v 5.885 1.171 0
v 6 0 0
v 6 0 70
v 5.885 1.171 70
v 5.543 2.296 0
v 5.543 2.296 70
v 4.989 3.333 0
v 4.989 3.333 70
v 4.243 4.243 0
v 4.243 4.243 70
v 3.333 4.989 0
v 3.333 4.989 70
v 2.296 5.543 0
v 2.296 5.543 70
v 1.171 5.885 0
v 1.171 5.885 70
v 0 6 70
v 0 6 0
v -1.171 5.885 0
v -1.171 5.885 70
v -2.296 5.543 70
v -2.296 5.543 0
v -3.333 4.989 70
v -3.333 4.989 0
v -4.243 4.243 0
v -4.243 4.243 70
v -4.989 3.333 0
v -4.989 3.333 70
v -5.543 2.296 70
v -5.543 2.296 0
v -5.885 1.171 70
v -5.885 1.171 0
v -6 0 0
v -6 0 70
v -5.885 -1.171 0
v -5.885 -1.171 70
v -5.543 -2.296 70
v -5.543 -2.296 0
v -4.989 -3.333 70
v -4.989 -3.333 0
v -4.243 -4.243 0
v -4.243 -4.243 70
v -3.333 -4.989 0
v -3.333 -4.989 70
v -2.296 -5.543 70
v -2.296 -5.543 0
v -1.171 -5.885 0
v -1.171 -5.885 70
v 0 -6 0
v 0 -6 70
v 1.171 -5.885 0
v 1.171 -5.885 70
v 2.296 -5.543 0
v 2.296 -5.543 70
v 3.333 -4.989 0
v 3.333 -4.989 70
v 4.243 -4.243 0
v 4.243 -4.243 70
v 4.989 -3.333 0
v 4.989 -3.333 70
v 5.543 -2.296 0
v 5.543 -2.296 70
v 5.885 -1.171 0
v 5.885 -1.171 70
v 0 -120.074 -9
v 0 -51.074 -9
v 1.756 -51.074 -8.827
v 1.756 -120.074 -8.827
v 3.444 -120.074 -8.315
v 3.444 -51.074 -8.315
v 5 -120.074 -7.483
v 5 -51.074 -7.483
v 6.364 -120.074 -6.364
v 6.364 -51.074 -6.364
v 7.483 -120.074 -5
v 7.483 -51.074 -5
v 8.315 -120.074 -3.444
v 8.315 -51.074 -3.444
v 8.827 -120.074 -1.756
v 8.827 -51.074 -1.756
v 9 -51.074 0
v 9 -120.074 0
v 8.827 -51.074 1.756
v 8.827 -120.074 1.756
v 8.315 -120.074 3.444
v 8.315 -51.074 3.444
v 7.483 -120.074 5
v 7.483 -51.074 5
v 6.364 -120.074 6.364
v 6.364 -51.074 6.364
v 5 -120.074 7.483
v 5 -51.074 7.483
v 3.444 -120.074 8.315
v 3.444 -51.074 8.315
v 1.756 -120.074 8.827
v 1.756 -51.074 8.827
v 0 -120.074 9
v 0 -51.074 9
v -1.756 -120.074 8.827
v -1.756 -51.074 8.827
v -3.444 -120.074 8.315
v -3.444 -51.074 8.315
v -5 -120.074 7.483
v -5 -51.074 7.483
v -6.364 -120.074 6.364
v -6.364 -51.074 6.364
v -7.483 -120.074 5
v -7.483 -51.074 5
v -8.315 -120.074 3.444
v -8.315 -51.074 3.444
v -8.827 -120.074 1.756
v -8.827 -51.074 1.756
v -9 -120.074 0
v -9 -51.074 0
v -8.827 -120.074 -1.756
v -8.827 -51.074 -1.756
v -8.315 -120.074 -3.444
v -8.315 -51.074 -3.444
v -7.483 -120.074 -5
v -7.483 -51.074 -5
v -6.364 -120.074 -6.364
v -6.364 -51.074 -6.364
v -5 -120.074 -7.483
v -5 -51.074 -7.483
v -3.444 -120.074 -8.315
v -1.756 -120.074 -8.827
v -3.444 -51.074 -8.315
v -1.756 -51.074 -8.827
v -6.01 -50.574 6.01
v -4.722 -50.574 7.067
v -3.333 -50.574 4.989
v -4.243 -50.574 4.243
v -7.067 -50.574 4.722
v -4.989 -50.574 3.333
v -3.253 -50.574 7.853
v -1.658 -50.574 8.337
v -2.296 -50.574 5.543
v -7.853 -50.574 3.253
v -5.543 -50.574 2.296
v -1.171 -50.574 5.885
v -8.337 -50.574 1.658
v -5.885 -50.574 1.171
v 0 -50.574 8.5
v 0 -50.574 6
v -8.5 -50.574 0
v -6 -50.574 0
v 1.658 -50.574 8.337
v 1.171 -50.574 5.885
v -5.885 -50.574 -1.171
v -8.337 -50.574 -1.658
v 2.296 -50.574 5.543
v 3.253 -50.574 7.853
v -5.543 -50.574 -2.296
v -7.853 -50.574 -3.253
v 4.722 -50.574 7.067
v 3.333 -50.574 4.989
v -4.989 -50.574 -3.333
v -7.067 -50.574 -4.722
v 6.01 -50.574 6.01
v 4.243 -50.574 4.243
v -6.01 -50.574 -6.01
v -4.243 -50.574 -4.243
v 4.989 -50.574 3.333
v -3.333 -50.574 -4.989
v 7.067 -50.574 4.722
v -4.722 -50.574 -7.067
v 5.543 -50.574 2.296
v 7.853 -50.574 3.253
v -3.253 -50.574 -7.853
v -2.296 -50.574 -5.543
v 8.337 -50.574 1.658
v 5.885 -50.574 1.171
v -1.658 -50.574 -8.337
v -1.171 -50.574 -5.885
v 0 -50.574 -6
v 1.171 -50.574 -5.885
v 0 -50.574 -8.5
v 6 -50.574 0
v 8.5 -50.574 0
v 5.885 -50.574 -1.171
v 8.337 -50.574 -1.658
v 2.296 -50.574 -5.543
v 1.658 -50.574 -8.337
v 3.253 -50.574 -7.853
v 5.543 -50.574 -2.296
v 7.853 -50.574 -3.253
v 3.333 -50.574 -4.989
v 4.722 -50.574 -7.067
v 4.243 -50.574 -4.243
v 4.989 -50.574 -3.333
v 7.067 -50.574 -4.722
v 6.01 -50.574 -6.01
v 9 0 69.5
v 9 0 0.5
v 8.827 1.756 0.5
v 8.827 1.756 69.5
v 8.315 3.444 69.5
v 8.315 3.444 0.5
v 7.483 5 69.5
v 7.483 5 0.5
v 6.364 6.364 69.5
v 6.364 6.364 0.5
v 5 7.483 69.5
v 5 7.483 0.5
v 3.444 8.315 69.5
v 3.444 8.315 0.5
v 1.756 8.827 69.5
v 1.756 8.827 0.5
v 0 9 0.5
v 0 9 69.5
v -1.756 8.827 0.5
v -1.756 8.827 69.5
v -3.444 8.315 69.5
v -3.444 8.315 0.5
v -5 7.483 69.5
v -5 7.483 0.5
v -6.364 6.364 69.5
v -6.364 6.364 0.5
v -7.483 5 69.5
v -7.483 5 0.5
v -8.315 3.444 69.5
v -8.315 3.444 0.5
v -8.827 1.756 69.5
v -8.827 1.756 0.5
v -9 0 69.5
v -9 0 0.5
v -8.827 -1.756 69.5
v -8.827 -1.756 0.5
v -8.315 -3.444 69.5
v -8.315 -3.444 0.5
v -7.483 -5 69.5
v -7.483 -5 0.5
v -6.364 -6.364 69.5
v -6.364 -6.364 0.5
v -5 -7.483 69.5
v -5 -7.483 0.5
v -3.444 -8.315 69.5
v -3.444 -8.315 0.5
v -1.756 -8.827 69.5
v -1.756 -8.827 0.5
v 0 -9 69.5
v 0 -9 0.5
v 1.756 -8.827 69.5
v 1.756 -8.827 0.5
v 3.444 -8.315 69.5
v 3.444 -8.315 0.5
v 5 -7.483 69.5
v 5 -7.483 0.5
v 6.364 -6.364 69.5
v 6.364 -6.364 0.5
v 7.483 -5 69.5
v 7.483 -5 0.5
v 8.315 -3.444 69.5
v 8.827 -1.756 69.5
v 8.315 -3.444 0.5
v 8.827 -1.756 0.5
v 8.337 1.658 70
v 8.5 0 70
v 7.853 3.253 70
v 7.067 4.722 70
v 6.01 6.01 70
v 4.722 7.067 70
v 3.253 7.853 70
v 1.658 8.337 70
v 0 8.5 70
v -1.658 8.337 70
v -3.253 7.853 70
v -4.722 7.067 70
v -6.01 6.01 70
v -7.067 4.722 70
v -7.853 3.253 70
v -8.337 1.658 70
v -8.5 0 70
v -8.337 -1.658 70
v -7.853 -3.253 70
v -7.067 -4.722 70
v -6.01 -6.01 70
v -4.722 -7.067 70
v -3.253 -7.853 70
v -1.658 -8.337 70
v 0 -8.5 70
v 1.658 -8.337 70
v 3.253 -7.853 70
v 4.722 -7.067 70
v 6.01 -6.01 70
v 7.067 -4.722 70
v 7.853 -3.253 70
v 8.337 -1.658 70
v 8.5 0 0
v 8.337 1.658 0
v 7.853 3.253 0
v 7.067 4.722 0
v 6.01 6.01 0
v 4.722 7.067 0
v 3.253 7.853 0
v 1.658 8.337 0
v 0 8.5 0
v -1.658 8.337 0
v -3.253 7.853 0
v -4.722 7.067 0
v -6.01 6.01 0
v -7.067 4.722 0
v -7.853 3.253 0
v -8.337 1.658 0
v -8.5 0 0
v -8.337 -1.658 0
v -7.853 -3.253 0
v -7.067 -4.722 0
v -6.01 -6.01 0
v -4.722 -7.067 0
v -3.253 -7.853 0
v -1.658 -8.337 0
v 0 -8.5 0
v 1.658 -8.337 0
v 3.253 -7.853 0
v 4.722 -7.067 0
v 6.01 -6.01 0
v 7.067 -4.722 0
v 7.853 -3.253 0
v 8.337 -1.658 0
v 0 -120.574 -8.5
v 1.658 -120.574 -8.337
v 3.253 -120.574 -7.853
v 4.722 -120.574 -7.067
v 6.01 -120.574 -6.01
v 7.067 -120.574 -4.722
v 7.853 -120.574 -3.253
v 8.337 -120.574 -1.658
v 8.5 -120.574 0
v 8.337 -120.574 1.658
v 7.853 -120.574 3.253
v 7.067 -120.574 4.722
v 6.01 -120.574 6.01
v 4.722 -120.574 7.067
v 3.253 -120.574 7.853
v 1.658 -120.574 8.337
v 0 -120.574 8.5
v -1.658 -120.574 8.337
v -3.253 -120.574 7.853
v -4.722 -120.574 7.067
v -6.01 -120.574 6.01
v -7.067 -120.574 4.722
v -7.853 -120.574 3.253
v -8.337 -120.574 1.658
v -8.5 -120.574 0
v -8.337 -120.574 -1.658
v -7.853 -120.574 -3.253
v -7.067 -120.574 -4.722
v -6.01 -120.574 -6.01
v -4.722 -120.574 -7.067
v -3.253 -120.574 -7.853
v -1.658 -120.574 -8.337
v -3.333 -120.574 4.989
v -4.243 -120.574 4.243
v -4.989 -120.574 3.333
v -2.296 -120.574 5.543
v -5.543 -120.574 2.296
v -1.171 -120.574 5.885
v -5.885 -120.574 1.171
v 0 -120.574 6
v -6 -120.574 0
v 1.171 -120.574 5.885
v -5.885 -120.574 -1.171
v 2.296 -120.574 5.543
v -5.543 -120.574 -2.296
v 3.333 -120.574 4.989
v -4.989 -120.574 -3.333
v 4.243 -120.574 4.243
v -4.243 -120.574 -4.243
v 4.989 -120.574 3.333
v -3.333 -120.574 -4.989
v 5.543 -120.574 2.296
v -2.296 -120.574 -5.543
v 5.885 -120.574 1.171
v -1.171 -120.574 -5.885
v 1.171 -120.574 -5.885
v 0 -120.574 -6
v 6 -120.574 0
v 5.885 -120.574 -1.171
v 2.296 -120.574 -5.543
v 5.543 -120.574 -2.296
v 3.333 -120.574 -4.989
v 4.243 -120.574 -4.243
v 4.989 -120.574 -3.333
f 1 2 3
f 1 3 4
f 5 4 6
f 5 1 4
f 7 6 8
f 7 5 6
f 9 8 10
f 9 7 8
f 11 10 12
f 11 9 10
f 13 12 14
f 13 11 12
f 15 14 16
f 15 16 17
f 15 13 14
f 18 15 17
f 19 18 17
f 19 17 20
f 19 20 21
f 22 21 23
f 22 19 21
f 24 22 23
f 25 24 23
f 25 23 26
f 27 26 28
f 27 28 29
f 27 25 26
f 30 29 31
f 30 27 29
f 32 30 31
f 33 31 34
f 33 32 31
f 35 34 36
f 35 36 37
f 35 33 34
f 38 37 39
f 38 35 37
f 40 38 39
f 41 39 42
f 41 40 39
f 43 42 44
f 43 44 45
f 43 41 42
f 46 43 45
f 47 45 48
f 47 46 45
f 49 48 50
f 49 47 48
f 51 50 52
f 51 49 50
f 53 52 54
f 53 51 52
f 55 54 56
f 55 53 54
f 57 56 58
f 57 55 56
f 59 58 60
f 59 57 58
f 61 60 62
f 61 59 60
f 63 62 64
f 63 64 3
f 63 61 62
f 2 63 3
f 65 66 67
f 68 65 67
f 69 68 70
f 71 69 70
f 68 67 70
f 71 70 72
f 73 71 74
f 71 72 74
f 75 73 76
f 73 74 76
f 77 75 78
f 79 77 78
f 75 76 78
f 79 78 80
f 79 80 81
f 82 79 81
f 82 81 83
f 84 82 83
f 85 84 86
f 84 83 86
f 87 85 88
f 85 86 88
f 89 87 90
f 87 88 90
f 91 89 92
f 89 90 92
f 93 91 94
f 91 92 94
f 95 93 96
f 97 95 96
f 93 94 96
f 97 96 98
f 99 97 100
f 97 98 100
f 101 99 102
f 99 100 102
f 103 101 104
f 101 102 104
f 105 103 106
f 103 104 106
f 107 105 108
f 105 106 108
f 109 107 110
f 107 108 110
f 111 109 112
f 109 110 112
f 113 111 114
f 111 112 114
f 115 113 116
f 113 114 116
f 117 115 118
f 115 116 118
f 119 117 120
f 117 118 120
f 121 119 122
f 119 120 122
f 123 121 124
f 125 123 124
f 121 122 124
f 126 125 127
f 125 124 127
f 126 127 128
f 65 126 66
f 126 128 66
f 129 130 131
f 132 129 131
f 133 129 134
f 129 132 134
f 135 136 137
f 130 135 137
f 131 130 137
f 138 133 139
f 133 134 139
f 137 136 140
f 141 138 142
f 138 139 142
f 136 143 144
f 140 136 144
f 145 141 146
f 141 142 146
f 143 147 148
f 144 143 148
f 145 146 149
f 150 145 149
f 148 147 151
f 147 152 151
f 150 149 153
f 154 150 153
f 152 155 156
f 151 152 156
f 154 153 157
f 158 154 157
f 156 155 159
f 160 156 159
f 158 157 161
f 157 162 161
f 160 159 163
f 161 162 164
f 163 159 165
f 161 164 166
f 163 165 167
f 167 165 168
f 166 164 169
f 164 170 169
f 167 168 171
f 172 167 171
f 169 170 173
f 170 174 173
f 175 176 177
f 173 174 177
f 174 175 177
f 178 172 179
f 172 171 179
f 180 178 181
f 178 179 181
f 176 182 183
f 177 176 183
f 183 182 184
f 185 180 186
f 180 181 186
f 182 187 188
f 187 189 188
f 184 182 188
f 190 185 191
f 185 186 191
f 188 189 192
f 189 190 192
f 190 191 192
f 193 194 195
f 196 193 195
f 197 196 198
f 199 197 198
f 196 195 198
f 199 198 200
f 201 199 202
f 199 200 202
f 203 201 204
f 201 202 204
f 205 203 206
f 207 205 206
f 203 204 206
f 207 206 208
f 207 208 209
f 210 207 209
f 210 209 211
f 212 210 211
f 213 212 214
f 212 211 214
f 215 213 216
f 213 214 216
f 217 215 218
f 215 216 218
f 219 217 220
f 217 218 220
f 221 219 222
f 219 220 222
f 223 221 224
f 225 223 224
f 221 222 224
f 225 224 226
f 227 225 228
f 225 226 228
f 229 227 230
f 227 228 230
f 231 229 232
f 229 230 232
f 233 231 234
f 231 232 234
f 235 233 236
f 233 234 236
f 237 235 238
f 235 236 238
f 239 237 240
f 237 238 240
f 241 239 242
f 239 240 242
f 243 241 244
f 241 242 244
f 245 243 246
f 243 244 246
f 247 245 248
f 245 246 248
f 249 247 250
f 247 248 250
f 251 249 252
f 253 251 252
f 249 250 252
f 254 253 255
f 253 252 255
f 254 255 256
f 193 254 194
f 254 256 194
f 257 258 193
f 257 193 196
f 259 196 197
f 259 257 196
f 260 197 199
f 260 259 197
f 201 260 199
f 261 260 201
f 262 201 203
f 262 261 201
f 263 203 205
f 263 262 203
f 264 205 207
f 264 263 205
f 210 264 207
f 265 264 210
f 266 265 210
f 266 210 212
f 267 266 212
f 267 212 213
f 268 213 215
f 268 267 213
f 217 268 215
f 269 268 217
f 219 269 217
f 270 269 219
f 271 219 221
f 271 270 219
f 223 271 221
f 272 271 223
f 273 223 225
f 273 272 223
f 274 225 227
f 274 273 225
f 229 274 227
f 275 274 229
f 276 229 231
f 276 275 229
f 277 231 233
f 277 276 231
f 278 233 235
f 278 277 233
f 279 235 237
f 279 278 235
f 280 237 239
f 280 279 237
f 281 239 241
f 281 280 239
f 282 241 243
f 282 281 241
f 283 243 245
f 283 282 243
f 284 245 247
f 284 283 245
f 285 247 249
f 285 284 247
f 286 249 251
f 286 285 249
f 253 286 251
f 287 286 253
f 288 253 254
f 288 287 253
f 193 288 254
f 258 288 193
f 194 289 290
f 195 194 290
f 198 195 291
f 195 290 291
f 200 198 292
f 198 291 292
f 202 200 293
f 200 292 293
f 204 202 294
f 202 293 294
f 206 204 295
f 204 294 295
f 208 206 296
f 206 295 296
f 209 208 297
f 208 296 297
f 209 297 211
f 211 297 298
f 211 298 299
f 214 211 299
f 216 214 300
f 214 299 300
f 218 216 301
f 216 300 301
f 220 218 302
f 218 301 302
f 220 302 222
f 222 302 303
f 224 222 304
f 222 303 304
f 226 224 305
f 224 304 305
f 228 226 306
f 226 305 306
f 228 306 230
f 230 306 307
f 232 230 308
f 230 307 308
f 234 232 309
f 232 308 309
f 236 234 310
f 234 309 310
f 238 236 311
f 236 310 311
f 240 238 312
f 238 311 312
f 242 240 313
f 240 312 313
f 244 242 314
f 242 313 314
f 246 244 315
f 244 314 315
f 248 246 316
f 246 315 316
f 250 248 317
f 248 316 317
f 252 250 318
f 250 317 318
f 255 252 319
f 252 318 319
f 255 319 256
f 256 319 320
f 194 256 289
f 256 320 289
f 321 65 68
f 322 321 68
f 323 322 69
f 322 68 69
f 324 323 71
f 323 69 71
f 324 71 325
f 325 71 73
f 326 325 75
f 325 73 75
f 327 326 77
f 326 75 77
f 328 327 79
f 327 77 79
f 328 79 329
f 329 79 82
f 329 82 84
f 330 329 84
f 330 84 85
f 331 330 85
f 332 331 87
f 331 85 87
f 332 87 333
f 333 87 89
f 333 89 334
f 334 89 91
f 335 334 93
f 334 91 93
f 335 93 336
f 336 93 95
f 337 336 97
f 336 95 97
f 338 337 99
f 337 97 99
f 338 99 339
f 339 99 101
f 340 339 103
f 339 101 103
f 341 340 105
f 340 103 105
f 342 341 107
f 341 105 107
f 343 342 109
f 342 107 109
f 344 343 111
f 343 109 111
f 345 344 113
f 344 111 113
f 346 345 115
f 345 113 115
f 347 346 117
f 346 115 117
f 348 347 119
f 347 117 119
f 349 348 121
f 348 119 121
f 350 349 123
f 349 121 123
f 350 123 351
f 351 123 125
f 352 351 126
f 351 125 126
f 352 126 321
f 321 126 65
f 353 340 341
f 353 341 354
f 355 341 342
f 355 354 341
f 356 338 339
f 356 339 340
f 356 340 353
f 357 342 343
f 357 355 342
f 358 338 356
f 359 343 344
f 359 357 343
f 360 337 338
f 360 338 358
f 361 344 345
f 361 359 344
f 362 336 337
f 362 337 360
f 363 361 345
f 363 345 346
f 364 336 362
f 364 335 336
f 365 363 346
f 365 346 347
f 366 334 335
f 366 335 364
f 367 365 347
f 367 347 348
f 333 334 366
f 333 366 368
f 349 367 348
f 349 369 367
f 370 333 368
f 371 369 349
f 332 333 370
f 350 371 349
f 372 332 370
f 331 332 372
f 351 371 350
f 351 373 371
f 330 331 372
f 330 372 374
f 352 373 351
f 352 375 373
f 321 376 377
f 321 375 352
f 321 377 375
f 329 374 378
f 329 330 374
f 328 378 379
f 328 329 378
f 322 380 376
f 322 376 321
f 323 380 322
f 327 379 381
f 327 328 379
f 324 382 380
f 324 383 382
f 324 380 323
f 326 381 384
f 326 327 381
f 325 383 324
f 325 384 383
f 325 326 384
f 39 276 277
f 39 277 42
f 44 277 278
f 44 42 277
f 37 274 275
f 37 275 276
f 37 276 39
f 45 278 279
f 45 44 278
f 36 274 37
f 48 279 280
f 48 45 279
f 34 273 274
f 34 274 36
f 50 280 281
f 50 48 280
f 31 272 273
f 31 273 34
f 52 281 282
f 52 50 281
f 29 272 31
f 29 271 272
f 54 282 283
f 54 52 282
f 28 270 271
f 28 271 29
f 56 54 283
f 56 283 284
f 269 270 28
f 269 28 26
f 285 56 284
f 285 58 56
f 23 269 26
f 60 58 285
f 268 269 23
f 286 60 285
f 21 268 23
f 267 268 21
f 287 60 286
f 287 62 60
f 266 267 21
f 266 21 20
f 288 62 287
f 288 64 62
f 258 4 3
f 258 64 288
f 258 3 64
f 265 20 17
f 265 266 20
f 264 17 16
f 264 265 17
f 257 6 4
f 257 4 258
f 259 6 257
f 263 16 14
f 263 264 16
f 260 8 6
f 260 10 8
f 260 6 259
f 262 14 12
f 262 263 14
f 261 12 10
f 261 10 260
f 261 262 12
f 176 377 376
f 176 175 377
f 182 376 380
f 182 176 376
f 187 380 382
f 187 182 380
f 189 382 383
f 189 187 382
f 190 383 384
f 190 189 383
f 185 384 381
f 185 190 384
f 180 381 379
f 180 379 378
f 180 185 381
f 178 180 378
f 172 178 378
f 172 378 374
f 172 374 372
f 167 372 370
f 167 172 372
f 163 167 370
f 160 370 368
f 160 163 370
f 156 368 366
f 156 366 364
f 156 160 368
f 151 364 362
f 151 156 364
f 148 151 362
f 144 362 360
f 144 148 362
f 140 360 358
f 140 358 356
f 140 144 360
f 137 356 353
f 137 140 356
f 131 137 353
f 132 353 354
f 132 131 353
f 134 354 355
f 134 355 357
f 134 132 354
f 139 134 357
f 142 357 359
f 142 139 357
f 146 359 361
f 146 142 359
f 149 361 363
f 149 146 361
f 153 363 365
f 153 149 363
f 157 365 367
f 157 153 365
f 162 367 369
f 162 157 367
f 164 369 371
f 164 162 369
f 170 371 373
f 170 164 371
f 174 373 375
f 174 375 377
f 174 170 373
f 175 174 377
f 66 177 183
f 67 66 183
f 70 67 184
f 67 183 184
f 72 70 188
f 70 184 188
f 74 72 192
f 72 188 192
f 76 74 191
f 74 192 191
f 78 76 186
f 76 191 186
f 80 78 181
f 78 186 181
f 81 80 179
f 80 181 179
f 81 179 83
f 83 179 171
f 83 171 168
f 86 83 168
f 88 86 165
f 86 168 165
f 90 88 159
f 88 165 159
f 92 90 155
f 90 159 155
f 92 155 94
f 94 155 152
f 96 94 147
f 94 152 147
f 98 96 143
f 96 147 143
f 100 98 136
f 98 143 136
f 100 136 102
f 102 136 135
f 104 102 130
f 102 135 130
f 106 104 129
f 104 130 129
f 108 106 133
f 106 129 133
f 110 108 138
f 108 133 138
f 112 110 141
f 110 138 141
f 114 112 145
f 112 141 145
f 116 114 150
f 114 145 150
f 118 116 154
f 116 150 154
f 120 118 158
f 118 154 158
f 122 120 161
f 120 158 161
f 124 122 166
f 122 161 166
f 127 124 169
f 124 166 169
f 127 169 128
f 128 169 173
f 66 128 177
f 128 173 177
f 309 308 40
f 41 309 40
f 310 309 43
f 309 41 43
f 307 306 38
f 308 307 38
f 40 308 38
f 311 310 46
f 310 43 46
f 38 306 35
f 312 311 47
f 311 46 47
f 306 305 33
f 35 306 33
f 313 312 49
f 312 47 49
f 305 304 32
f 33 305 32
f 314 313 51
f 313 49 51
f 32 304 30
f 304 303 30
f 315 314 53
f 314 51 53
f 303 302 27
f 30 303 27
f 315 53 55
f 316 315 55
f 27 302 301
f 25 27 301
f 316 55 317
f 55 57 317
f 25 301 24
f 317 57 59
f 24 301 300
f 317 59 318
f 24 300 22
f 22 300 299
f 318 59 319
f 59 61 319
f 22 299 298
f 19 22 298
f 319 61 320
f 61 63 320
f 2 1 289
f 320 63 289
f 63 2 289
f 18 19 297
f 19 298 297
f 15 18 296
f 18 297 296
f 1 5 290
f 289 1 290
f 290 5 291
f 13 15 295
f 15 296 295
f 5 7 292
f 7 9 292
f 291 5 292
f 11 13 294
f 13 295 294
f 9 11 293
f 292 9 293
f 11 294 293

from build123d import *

# Parameters (mm, degrees)
F2_R     = 9
F2_R_2   = 6
F3_DEPTH = 70
F4_SIZE  = 0.5
F5_W     = 70
F5_H     = 3
F7_SIZE  = 0.5


with BuildPart() as f3:
    # F2 (on Top) → F3 (new body)
    with BuildSketch(Plane.XY):
        Circle(F2_R)
        Circle(F2_R_2, mode=Mode.SUBTRACT)
    extrude(amount=F3_DEPTH)

    # F4
    f4_edges = [f3.edges().sort_by_distance(p)[0] for p in [
        (-9, 0, 70),
        (-9, 0, 0),
    ]]
    chamfer(f4_edges, length=F4_SIZE)


with BuildPart() as f6:
    # F5 (on Right) → F6 (revolve)
    with BuildSketch(Plane.YZ):
        with Locations((-85.5741620872, -7.5)):
            Rectangle(F5_W, F5_H)
    revolve(axis=Axis((0, -85.5741620872, 0), (0, -1, 0)))

    # F7
    f7_edges = [f6.edges().sort_by_distance(p)[0] for p in [
        (0, -120.574162, 9),
        (0, -50.574162, 9),
    ]]
    chamfer(f7_edges, length=F7_SIZE)


solid = Compound([f3.part, f6.part])
